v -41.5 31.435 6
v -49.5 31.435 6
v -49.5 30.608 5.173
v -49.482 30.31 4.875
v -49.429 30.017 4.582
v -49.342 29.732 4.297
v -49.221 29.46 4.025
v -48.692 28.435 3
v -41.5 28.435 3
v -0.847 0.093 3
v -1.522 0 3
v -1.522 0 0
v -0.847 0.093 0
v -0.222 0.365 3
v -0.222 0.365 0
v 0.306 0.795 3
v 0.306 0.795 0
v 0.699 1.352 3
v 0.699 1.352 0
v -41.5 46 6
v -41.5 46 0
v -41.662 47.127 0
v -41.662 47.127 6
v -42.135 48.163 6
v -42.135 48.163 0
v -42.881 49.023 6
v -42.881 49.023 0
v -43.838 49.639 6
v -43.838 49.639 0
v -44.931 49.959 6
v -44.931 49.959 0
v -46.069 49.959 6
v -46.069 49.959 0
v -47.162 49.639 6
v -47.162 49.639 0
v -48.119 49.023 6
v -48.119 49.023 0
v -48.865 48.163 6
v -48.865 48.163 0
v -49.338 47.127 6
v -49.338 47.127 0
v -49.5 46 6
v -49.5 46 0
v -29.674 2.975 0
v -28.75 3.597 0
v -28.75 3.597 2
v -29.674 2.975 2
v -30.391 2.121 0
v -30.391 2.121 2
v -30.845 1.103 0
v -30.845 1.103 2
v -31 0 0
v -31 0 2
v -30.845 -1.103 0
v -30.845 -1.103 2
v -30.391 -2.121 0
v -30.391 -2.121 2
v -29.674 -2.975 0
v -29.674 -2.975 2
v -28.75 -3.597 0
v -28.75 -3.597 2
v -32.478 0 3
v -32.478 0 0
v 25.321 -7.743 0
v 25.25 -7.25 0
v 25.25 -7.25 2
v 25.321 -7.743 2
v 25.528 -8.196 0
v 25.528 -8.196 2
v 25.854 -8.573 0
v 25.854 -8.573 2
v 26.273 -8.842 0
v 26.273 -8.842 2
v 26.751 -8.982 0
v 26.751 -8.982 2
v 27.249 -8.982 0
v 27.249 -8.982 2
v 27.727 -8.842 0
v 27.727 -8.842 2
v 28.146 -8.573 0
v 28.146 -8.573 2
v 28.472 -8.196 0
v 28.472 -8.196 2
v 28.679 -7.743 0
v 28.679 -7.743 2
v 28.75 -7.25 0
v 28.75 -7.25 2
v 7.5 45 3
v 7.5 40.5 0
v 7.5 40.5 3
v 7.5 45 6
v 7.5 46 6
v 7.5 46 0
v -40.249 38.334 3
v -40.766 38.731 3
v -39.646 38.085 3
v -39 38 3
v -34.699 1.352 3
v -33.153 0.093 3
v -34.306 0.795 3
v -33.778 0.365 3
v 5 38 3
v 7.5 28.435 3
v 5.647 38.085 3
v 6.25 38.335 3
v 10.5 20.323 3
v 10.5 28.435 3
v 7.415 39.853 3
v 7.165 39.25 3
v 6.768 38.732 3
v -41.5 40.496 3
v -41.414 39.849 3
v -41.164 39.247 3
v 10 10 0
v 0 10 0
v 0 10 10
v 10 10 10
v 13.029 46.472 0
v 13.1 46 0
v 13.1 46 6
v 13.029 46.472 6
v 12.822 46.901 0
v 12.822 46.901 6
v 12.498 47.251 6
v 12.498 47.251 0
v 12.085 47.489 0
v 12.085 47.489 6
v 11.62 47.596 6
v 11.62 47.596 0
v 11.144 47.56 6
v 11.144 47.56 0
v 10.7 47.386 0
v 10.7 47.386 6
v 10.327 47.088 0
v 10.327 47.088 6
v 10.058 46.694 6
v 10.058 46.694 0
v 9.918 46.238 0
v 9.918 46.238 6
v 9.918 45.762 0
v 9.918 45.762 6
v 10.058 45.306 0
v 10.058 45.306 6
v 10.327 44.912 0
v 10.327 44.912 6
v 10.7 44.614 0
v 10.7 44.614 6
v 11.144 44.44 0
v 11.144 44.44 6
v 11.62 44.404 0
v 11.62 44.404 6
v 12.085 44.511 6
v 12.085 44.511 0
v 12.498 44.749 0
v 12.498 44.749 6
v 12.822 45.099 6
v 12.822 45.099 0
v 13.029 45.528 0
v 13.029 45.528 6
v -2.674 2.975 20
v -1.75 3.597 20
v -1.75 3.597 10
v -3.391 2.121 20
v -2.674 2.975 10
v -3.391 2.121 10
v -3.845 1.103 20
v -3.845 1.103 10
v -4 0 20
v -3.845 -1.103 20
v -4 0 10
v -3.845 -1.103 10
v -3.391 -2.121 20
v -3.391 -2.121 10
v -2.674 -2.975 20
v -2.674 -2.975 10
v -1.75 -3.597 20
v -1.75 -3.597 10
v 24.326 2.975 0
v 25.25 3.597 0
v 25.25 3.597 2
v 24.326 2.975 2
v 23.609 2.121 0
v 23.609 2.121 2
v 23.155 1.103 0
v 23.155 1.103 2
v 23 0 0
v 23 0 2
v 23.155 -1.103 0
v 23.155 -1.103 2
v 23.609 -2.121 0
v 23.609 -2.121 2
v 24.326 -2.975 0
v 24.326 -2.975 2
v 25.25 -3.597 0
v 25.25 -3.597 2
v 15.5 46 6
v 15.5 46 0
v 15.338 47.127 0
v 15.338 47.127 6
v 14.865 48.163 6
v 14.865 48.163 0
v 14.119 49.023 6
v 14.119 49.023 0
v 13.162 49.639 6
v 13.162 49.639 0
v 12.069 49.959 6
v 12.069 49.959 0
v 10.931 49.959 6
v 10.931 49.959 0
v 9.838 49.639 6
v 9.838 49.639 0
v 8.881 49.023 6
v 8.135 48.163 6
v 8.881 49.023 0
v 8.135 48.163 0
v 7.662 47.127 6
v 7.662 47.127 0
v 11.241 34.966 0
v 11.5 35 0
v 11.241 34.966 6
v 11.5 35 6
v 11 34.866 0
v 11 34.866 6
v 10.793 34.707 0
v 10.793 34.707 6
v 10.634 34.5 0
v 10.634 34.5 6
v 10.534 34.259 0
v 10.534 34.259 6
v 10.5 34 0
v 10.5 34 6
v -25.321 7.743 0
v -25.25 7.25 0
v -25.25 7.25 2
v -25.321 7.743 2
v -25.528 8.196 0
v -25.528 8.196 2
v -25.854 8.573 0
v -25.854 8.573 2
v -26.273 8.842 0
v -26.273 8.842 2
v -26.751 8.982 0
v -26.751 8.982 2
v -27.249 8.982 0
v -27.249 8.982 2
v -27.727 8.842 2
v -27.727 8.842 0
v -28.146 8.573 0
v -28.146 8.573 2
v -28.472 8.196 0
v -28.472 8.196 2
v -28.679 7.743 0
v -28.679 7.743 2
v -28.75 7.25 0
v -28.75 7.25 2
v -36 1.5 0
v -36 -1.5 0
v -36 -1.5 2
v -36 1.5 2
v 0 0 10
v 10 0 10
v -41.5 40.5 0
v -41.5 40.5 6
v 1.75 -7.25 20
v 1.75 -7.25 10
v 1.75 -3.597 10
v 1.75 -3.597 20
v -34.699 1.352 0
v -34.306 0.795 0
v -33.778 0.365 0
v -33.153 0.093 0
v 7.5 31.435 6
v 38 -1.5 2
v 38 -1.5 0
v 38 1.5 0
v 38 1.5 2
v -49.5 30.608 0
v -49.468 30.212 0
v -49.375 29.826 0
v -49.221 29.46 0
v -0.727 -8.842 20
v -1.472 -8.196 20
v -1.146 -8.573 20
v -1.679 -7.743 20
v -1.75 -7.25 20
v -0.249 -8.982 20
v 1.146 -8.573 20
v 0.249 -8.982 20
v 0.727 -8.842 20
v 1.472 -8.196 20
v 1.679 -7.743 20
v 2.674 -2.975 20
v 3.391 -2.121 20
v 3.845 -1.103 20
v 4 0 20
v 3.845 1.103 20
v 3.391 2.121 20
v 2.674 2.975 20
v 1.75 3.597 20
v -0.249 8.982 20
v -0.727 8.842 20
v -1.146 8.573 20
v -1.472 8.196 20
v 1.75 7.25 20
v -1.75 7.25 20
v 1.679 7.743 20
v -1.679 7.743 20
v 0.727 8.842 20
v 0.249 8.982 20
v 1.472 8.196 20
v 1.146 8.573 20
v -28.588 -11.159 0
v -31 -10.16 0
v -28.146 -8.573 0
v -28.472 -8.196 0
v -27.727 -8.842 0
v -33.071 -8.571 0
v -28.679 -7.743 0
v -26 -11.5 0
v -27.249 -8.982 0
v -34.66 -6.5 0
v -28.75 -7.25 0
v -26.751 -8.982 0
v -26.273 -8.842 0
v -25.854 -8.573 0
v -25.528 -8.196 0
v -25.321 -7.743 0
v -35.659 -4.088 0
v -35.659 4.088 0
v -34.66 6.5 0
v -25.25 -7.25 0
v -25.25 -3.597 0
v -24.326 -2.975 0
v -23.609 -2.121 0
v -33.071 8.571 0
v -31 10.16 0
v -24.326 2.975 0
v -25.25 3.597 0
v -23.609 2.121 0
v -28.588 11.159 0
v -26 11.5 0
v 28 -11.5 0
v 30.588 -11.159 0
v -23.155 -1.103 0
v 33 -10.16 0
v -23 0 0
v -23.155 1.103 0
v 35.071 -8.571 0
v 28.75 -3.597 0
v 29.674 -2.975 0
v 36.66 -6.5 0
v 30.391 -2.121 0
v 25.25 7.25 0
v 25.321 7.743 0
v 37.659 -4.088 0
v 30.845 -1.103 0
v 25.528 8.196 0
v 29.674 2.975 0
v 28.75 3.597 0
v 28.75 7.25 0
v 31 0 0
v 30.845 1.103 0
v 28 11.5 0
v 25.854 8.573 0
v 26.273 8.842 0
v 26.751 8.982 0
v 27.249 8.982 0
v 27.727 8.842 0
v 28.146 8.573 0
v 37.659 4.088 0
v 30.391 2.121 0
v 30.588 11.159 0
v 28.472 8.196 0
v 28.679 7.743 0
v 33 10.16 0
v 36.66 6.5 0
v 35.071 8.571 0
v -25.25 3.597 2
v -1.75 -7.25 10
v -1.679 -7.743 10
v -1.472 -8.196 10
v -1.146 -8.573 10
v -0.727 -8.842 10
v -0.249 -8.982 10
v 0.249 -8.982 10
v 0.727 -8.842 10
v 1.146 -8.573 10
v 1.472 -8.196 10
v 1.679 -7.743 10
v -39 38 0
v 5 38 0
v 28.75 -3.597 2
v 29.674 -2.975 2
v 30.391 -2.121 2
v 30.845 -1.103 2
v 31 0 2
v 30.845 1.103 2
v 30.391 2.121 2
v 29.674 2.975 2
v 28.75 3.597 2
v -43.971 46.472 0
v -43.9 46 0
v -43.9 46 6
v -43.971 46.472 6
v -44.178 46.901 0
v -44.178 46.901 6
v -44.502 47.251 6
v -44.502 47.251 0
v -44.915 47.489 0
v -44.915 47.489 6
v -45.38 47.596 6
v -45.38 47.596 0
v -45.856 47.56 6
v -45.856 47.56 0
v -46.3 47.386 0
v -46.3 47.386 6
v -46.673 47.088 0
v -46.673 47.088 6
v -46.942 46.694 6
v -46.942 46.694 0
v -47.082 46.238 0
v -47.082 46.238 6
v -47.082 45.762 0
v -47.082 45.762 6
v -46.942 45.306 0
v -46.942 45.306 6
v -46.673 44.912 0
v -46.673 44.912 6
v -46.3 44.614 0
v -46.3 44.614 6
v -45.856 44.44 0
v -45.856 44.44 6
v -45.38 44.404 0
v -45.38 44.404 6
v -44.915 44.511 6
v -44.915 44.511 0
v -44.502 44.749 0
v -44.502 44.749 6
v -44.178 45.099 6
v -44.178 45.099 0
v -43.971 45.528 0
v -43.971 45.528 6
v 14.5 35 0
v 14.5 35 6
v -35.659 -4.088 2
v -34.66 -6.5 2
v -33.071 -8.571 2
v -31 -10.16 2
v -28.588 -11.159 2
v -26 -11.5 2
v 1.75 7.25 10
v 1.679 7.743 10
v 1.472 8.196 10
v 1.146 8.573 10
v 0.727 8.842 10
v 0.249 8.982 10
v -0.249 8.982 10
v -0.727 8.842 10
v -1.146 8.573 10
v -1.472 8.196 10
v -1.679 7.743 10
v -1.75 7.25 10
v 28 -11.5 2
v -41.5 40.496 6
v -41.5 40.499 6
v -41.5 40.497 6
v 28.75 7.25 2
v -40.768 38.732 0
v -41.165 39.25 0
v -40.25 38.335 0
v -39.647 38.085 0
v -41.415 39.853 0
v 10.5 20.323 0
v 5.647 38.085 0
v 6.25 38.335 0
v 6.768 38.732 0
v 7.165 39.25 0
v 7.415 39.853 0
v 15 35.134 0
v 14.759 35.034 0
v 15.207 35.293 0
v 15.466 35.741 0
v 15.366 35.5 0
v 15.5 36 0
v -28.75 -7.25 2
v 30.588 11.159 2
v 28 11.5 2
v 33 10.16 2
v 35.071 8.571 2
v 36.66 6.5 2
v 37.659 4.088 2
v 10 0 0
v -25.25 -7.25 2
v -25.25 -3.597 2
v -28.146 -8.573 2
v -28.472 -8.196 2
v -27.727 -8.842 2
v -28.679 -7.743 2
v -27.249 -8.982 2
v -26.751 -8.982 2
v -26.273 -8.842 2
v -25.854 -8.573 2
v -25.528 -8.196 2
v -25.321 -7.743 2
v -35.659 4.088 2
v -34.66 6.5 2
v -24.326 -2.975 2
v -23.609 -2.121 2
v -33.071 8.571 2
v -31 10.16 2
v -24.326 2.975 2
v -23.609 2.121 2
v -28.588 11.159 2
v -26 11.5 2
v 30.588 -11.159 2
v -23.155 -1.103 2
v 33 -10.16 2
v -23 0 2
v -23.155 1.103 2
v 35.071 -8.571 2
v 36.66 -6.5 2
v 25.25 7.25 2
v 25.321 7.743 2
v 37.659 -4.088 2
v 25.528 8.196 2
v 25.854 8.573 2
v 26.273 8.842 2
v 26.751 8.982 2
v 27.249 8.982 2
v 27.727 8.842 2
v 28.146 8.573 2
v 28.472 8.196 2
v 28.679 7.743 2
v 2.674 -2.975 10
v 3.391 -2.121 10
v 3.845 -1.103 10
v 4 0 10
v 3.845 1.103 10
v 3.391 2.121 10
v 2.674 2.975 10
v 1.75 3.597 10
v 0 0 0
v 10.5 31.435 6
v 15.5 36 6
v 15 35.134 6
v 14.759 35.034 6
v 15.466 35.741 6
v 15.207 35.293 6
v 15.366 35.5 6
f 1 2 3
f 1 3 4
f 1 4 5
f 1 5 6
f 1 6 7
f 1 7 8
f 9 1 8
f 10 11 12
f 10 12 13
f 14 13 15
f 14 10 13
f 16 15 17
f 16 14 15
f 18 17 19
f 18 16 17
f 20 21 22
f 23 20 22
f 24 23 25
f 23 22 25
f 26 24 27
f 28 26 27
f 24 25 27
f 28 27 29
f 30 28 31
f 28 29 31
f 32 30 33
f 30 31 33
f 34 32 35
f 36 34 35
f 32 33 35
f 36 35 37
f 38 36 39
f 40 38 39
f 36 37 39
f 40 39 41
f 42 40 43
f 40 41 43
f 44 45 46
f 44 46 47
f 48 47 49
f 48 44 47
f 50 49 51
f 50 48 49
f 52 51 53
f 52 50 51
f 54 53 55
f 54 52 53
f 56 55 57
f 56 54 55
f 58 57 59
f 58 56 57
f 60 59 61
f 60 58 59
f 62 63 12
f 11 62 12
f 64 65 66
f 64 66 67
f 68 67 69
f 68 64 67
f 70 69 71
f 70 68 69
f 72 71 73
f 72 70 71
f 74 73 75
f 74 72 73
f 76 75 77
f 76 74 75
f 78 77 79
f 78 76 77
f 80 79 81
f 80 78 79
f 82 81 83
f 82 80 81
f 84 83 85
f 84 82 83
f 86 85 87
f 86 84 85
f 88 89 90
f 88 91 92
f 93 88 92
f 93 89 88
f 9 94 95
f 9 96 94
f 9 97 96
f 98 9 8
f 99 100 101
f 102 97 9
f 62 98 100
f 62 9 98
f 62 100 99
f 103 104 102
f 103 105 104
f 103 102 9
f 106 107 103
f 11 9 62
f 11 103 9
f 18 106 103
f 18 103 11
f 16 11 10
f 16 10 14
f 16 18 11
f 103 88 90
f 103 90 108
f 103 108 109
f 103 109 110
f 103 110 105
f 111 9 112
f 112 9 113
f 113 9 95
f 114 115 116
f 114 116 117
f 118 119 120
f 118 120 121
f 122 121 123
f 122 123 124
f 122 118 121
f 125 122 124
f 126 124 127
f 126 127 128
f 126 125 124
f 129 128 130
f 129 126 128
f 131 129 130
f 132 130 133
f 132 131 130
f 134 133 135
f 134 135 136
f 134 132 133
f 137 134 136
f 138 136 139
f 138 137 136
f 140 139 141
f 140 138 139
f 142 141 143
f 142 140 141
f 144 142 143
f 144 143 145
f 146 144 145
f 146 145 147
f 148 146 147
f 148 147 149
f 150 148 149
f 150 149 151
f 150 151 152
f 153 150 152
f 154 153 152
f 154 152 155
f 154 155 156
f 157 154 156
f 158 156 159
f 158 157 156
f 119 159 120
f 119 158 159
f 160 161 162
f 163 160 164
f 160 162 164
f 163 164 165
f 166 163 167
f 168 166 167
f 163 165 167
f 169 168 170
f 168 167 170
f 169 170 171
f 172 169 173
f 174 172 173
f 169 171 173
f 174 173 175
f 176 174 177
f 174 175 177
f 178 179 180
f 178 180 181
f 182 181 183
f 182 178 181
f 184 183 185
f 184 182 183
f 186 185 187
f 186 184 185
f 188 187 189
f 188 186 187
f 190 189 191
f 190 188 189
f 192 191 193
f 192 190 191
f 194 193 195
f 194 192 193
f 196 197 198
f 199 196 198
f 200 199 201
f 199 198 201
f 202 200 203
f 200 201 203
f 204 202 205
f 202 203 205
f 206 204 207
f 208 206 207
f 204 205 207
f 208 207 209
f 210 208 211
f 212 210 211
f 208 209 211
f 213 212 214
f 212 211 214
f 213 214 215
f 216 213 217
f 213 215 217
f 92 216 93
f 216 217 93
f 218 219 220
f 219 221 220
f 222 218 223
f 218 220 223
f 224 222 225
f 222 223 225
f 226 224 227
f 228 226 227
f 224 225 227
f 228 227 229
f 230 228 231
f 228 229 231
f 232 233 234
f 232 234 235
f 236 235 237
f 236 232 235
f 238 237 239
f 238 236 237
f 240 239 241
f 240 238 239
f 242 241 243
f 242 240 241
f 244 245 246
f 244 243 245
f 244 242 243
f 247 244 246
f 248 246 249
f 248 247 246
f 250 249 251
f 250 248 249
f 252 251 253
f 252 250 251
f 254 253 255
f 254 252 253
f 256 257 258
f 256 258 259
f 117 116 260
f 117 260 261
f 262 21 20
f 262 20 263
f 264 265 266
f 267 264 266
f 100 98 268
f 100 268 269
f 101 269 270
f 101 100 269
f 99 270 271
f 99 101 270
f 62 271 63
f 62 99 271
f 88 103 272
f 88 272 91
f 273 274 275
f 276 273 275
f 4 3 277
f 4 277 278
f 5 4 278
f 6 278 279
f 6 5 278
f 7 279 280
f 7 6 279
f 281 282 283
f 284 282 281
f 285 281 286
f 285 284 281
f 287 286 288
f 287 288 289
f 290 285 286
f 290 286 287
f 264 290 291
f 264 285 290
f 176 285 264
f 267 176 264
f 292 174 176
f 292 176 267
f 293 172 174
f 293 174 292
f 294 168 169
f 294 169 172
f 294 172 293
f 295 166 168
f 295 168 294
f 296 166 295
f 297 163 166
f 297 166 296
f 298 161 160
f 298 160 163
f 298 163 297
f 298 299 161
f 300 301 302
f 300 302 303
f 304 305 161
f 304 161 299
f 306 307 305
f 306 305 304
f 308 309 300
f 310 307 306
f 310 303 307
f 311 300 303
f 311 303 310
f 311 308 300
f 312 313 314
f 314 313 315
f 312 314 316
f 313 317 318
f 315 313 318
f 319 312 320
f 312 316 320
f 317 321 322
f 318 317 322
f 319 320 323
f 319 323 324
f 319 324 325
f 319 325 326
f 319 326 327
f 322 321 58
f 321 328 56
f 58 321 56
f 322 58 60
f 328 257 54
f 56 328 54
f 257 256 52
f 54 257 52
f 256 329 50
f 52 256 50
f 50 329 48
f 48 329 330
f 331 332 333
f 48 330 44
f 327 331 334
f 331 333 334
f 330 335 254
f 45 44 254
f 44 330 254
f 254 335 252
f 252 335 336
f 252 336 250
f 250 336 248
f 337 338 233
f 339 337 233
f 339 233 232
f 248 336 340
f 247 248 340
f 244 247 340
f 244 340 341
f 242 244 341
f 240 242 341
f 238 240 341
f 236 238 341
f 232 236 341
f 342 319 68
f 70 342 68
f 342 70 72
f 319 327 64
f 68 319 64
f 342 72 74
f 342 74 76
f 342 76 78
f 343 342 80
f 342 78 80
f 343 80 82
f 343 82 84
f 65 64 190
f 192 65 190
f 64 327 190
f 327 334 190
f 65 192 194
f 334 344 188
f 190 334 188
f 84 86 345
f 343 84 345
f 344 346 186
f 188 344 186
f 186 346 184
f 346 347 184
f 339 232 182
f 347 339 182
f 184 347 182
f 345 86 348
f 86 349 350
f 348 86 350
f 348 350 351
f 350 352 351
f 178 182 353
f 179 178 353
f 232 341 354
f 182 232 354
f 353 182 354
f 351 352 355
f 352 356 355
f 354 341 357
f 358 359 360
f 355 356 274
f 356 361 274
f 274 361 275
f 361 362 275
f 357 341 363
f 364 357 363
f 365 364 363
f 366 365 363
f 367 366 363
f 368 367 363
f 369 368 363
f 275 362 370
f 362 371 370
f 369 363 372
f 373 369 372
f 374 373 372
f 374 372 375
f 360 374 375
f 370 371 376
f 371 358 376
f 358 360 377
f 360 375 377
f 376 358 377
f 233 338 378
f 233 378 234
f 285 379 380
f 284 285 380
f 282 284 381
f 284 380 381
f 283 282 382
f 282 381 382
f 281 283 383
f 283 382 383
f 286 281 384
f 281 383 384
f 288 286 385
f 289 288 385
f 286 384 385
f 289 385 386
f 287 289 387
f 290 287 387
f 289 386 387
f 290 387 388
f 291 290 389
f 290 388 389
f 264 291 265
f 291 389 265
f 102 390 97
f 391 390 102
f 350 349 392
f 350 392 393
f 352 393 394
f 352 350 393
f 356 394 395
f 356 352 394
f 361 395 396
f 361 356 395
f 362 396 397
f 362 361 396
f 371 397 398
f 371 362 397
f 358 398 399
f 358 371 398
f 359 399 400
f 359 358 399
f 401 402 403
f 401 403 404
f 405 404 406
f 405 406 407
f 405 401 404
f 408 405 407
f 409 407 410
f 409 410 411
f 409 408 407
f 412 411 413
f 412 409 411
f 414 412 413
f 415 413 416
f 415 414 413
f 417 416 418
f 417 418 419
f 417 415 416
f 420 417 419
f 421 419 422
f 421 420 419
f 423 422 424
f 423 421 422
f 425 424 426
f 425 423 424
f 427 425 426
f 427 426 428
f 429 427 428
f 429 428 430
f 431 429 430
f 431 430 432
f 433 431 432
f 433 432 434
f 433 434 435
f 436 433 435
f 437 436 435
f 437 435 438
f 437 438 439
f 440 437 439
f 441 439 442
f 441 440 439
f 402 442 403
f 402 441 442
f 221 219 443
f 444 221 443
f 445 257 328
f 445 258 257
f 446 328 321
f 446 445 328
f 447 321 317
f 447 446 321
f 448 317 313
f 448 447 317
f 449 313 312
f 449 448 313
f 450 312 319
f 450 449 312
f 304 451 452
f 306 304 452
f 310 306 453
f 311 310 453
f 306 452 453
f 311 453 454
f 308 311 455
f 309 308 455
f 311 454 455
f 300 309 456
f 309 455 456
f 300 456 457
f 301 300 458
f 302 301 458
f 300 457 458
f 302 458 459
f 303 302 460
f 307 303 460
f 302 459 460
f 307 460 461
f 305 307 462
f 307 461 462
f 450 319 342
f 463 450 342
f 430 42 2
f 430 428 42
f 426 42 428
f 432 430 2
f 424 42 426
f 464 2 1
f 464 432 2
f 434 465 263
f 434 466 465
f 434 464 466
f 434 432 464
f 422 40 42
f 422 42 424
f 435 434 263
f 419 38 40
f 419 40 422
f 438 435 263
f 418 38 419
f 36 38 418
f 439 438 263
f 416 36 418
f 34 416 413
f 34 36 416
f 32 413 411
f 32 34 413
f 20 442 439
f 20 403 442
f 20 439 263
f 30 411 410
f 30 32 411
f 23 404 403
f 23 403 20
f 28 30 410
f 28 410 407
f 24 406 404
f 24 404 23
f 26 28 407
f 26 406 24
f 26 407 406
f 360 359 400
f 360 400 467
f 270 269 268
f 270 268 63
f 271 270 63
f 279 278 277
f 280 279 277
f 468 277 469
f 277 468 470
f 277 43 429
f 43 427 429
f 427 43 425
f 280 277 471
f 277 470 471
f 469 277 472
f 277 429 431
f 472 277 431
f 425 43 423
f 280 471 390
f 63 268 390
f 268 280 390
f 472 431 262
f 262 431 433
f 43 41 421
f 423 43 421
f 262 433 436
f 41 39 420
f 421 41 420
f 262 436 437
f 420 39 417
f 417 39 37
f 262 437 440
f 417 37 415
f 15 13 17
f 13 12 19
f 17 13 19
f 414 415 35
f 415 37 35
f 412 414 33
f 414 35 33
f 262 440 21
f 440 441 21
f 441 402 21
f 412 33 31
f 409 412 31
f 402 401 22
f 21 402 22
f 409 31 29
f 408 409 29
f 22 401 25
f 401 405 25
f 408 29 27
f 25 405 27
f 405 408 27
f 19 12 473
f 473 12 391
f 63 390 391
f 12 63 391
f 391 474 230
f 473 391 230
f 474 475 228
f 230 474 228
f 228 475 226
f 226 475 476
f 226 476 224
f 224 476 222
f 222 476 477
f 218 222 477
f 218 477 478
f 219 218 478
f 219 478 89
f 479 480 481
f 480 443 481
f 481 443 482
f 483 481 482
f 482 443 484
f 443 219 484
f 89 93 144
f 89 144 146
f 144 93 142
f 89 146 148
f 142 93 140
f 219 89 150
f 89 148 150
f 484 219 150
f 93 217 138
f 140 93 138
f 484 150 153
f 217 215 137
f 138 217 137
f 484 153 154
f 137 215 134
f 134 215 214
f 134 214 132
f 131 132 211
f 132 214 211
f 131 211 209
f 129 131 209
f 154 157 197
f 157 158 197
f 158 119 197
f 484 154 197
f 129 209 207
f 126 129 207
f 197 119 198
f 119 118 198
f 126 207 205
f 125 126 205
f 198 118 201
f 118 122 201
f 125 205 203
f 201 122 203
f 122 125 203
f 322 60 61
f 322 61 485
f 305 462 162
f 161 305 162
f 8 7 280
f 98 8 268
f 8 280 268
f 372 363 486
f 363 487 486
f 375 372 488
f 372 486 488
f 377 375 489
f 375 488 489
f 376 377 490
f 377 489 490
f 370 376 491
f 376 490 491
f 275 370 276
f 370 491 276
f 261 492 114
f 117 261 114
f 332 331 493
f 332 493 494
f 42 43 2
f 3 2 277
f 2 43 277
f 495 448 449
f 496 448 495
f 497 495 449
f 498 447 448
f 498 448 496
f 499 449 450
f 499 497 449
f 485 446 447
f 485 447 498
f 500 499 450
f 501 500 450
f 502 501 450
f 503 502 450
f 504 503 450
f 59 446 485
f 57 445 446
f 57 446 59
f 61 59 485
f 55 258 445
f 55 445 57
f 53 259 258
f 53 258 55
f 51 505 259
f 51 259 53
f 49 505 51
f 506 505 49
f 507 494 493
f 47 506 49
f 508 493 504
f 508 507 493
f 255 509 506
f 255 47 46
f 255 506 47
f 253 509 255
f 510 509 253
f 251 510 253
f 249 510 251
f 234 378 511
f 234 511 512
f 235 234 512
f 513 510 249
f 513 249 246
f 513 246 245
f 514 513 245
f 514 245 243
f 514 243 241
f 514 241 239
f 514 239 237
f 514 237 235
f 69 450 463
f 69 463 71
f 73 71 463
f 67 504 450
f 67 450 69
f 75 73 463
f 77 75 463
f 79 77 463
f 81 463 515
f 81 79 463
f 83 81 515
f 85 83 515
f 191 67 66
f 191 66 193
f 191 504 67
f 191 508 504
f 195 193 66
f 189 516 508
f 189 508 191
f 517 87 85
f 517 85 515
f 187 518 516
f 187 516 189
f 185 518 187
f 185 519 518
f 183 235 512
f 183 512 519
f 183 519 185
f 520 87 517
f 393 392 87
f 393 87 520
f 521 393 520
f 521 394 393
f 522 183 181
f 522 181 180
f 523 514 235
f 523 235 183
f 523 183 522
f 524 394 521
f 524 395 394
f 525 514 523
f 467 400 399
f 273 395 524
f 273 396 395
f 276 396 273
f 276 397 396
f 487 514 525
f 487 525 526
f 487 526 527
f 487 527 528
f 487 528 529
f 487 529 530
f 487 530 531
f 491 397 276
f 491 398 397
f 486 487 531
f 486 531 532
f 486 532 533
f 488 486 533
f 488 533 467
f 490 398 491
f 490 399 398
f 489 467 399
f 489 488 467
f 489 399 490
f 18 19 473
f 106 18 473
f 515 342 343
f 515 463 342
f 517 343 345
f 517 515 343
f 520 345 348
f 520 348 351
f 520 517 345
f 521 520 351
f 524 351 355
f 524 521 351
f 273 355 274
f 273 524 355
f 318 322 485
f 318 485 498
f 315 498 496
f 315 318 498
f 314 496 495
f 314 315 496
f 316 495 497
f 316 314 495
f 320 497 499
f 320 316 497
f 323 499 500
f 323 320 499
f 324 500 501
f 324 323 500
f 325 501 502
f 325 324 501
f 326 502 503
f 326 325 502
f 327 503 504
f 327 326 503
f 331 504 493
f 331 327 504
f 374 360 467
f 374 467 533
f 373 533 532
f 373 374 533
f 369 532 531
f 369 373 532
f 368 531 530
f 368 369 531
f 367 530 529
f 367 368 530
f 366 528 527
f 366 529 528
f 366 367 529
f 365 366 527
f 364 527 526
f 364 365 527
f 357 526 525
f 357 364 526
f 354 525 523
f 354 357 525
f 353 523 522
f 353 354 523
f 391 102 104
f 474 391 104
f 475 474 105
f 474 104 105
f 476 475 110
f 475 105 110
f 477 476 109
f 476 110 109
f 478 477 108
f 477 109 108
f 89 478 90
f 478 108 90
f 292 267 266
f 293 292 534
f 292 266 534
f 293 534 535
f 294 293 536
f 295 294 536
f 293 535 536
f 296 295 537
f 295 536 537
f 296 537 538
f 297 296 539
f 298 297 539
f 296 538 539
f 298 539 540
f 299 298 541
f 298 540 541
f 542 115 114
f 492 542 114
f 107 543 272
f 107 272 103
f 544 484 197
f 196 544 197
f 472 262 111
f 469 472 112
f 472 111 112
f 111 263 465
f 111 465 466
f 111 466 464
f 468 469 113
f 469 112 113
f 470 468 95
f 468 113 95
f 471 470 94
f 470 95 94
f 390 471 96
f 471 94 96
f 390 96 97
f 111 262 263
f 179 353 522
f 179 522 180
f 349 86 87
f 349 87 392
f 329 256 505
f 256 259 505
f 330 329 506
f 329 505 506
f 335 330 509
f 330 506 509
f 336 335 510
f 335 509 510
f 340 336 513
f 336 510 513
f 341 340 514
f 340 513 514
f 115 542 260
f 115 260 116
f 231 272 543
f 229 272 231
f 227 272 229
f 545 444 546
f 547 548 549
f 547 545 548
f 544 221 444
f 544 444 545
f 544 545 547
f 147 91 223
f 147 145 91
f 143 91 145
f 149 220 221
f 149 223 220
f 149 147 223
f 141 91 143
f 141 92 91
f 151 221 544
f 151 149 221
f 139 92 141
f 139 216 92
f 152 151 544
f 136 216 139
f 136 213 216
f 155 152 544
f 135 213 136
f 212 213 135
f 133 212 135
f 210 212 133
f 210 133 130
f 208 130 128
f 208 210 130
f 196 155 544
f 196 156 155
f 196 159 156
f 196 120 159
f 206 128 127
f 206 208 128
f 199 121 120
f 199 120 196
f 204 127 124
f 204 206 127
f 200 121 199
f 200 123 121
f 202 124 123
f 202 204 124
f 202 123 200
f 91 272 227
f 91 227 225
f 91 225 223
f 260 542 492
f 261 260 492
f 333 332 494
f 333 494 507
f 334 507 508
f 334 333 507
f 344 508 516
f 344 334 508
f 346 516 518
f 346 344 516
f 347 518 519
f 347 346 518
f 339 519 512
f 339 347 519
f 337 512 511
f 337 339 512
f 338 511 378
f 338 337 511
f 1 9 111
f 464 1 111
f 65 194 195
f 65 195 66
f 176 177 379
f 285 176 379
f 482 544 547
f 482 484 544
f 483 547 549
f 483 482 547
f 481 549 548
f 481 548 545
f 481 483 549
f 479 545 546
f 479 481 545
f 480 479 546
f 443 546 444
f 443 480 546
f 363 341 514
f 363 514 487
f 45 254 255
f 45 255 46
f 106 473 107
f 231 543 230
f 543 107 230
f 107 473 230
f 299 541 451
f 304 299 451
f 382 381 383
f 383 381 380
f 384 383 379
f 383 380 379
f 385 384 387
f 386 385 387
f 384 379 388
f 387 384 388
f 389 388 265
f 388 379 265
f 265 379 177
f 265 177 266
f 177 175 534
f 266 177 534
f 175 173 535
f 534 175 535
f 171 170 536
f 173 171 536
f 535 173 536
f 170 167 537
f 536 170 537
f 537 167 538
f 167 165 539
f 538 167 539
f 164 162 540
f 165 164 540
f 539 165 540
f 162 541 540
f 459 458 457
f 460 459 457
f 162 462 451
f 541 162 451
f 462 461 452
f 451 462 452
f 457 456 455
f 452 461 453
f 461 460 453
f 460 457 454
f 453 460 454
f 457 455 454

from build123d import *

# Parameters (mm, degrees)
BOX_W        = 10
BOX_H        = 10
BOX_DEPTH    = 10
PAD001_DEPTH = 10
BOX001_W     = 74
BOX001_H     = 23
BOX001_DEPTH = 2
FILLET001_R  = 10
BOX003_W     = 16
BOX003_H     = 20
BOX003_DEPTH = 10
BOX002_W     = 49
BOX002_H     = 45
BOX002_DEPTH = 10
PAD002_DEPTH = 85
SKETCH_R     = 1.6
PAD_DEPTH    = 6
FILLET_R     = 2.5
FILLET002_R  = 1


with BuildPart() as cube:
    # Box → Box (new body)
    with BuildSketch(Plane.XY):
        with Locations((5, 5)):
            Rectangle(BOX_W, BOX_H)
    extrude(amount=BOX_DEPTH)


with BuildPart() as pad001:
    # Sketch003 → Pad001 (new body)
    with BuildSketch(Plane.XY.offset(10)):
        with BuildLine():
            ThreePointArc((-1.75, 3.596874), (-4, 0), (-1.75, -3.596874))
            Line((-1.75, -3.596874), (-1.75, -7.25))
            ThreePointArc((-1.75, -7.25), (0, -9), (1.75, -7.25))
            Line((1.75, -7.25), (1.75, -3.596874))
            ThreePointArc((1.75, -3.596874), (4, 0), (1.75, 3.596874))
            Line((1.75, 3.596874), (1.75, 7.25))
            ThreePointArc((1.75, 7.25), (5e-06, 9.00001), (-1.75, 7.25001))
            Line((-1.75, 7.25001), (-1.75, 3.596874))
        make_face()
    extrude(amount=PAD001_DEPTH)


with BuildPart() as clone_of_pad002:
    # Clone001 base: copy of Pad001
    add(pad001.part)


with BuildPart() as clone_of_pad002_1:
    # Clone001 placement: moved
    add(clone_of_pad002.part.moved(Location((27, 0, 0))))


with BuildPart() as fusion:
    # Clone base: copy of Pad001
    add(pad001.part)


with BuildPart() as fusion_1:
    # Clone placement: moved
    add(fusion.part.moved(Location((-27, 0, 0))))

    # Fusion: union Clone of Pad002
    add(clone_of_pad002_1.part)


with BuildPart() as fusion_2:
    # Fusion placement: moved
    add(fusion_1.part.moved(Location((0, 0, -14))))


with BuildPart() as fillet001:
    # Box001 → Box001 (new body)
    with BuildSketch(Plane(origin=(-36, -11.5, 0), x_dir=(1, 0, 0), z_dir=(0, 0, 1))):
        with Locations((37, 11.5)):
            Rectangle(BOX001_W, BOX001_H)
    extrude(amount=BOX001_DEPTH)

    # Cut: cut Fusion
    add(fusion_2.part, mode=Mode.SUBTRACT)

    # Fillet001
    fillet001_edges = [fillet001.edges().sort_by_distance(p)[0] for p in [
        (-36, -11.5, 1),
        (-36, 11.5, 1),
        (38, -11.5, 1),
        (38, 11.5, 1),
    ]]
    fillet(fillet001_edges, radius=FILLET001_R)


with BuildPart() as cube003:
    # Box003 → Box003 (new body)
    with BuildSketch(Plane(origin=(10.5, 15, -1), x_dir=(1, 0, 0), z_dir=(0, 0, 1))):
        with Locations((8, 10)):
            Rectangle(BOX003_W, BOX003_H)
    extrude(amount=BOX003_DEPTH)


with BuildPart() as cube002:
    # Box002 → Box002 (new body)
    with BuildSketch(Plane(origin=(-41.5, 0, 3), x_dir=(1, 0, 0), z_dir=(0, 0, 1))):
        with Locations((24.5, 22.5)):
            Rectangle(BOX002_W, BOX002_H)
    extrude(amount=BOX002_DEPTH)


with BuildPart() as pad002:
    # Sketch004 → Pad002 (new body)
    with BuildSketch(Plane.YZ.offset(20)):
        Polygon((-6.988396, 21.148684), (46.583859, 21.148684), (28.435175, 3), (-6.988396, 3), align=None)
    extrude(amount=-PAD002_DEPTH)


with BuildPart() as fillet002:
    # Sketch → Pad (new body)
    with BuildSketch(Plane.XY):
        with BuildLine():
            Line((-49.500004, 46.000012), (-49.500004, 30.000012))
            Line((-49.500004, 30.000012), (-34, 0))
            Line((-34, 0), (0, 0))
            Line((0, 0), (15.499996, 30.000016))
            Line((15.499996, 30.000016), (15.499996, 46.000016))
            ThreePointArc((15.499996, 46.000016), (11.499995, 50), (7.499996, 46.000014))
            Line((7.499996, 38), (7.499996, 46.000014))
            Line((-41.500004, 38), (7.499996, 38))
            Line((-41.500004, 46.000014), (-41.500004, 38))
            ThreePointArc((-41.500004, 46.000014), (-45.500004, 50), (-49.500004, 46.000012))
        make_face()
        with Locations((-45.500004, 46)):
            Circle(SKETCH_R, mode=Mode.SUBTRACT)
        with Locations((11.499996, 46)):
            Circle(SKETCH_R, mode=Mode.SUBTRACT)
    extrude(amount=PAD_DEPTH)

    # Fillet
    fillet_edges = [fillet002.edges().sort_by_distance(p)[0] for p in [
        (-49.500004, 30.000012, 3),
        (-34, 0, 3),
        (0, 0, 3),
        (15.499996, 30.000016, 3),
        (7.499996, 38, 3),
        (-41.500004, 38, 3),
    ]]
    fillet(fillet_edges, radius=FILLET_R)

    # Cut001: cut Pad002
    add(pad002.part, mode=Mode.SUBTRACT)

    # Cut002: cut Cube002
    add(cube002.part, mode=Mode.SUBTRACT)

    # Cut003: cut Cube003
    add(cube003.part, mode=Mode.SUBTRACT)

    # Fillet002
    fillet002_edges = [fillet002.edges().sort_by_distance(p)[0] for p in [
        (10.5, 35, 3),
        (15.499996, 35, 3),
    ]]
    fillet(fillet002_edges, radius=FILLET002_R)


solid = Compound([cube.part, pad001.part, fillet001.part, fillet002.part])
